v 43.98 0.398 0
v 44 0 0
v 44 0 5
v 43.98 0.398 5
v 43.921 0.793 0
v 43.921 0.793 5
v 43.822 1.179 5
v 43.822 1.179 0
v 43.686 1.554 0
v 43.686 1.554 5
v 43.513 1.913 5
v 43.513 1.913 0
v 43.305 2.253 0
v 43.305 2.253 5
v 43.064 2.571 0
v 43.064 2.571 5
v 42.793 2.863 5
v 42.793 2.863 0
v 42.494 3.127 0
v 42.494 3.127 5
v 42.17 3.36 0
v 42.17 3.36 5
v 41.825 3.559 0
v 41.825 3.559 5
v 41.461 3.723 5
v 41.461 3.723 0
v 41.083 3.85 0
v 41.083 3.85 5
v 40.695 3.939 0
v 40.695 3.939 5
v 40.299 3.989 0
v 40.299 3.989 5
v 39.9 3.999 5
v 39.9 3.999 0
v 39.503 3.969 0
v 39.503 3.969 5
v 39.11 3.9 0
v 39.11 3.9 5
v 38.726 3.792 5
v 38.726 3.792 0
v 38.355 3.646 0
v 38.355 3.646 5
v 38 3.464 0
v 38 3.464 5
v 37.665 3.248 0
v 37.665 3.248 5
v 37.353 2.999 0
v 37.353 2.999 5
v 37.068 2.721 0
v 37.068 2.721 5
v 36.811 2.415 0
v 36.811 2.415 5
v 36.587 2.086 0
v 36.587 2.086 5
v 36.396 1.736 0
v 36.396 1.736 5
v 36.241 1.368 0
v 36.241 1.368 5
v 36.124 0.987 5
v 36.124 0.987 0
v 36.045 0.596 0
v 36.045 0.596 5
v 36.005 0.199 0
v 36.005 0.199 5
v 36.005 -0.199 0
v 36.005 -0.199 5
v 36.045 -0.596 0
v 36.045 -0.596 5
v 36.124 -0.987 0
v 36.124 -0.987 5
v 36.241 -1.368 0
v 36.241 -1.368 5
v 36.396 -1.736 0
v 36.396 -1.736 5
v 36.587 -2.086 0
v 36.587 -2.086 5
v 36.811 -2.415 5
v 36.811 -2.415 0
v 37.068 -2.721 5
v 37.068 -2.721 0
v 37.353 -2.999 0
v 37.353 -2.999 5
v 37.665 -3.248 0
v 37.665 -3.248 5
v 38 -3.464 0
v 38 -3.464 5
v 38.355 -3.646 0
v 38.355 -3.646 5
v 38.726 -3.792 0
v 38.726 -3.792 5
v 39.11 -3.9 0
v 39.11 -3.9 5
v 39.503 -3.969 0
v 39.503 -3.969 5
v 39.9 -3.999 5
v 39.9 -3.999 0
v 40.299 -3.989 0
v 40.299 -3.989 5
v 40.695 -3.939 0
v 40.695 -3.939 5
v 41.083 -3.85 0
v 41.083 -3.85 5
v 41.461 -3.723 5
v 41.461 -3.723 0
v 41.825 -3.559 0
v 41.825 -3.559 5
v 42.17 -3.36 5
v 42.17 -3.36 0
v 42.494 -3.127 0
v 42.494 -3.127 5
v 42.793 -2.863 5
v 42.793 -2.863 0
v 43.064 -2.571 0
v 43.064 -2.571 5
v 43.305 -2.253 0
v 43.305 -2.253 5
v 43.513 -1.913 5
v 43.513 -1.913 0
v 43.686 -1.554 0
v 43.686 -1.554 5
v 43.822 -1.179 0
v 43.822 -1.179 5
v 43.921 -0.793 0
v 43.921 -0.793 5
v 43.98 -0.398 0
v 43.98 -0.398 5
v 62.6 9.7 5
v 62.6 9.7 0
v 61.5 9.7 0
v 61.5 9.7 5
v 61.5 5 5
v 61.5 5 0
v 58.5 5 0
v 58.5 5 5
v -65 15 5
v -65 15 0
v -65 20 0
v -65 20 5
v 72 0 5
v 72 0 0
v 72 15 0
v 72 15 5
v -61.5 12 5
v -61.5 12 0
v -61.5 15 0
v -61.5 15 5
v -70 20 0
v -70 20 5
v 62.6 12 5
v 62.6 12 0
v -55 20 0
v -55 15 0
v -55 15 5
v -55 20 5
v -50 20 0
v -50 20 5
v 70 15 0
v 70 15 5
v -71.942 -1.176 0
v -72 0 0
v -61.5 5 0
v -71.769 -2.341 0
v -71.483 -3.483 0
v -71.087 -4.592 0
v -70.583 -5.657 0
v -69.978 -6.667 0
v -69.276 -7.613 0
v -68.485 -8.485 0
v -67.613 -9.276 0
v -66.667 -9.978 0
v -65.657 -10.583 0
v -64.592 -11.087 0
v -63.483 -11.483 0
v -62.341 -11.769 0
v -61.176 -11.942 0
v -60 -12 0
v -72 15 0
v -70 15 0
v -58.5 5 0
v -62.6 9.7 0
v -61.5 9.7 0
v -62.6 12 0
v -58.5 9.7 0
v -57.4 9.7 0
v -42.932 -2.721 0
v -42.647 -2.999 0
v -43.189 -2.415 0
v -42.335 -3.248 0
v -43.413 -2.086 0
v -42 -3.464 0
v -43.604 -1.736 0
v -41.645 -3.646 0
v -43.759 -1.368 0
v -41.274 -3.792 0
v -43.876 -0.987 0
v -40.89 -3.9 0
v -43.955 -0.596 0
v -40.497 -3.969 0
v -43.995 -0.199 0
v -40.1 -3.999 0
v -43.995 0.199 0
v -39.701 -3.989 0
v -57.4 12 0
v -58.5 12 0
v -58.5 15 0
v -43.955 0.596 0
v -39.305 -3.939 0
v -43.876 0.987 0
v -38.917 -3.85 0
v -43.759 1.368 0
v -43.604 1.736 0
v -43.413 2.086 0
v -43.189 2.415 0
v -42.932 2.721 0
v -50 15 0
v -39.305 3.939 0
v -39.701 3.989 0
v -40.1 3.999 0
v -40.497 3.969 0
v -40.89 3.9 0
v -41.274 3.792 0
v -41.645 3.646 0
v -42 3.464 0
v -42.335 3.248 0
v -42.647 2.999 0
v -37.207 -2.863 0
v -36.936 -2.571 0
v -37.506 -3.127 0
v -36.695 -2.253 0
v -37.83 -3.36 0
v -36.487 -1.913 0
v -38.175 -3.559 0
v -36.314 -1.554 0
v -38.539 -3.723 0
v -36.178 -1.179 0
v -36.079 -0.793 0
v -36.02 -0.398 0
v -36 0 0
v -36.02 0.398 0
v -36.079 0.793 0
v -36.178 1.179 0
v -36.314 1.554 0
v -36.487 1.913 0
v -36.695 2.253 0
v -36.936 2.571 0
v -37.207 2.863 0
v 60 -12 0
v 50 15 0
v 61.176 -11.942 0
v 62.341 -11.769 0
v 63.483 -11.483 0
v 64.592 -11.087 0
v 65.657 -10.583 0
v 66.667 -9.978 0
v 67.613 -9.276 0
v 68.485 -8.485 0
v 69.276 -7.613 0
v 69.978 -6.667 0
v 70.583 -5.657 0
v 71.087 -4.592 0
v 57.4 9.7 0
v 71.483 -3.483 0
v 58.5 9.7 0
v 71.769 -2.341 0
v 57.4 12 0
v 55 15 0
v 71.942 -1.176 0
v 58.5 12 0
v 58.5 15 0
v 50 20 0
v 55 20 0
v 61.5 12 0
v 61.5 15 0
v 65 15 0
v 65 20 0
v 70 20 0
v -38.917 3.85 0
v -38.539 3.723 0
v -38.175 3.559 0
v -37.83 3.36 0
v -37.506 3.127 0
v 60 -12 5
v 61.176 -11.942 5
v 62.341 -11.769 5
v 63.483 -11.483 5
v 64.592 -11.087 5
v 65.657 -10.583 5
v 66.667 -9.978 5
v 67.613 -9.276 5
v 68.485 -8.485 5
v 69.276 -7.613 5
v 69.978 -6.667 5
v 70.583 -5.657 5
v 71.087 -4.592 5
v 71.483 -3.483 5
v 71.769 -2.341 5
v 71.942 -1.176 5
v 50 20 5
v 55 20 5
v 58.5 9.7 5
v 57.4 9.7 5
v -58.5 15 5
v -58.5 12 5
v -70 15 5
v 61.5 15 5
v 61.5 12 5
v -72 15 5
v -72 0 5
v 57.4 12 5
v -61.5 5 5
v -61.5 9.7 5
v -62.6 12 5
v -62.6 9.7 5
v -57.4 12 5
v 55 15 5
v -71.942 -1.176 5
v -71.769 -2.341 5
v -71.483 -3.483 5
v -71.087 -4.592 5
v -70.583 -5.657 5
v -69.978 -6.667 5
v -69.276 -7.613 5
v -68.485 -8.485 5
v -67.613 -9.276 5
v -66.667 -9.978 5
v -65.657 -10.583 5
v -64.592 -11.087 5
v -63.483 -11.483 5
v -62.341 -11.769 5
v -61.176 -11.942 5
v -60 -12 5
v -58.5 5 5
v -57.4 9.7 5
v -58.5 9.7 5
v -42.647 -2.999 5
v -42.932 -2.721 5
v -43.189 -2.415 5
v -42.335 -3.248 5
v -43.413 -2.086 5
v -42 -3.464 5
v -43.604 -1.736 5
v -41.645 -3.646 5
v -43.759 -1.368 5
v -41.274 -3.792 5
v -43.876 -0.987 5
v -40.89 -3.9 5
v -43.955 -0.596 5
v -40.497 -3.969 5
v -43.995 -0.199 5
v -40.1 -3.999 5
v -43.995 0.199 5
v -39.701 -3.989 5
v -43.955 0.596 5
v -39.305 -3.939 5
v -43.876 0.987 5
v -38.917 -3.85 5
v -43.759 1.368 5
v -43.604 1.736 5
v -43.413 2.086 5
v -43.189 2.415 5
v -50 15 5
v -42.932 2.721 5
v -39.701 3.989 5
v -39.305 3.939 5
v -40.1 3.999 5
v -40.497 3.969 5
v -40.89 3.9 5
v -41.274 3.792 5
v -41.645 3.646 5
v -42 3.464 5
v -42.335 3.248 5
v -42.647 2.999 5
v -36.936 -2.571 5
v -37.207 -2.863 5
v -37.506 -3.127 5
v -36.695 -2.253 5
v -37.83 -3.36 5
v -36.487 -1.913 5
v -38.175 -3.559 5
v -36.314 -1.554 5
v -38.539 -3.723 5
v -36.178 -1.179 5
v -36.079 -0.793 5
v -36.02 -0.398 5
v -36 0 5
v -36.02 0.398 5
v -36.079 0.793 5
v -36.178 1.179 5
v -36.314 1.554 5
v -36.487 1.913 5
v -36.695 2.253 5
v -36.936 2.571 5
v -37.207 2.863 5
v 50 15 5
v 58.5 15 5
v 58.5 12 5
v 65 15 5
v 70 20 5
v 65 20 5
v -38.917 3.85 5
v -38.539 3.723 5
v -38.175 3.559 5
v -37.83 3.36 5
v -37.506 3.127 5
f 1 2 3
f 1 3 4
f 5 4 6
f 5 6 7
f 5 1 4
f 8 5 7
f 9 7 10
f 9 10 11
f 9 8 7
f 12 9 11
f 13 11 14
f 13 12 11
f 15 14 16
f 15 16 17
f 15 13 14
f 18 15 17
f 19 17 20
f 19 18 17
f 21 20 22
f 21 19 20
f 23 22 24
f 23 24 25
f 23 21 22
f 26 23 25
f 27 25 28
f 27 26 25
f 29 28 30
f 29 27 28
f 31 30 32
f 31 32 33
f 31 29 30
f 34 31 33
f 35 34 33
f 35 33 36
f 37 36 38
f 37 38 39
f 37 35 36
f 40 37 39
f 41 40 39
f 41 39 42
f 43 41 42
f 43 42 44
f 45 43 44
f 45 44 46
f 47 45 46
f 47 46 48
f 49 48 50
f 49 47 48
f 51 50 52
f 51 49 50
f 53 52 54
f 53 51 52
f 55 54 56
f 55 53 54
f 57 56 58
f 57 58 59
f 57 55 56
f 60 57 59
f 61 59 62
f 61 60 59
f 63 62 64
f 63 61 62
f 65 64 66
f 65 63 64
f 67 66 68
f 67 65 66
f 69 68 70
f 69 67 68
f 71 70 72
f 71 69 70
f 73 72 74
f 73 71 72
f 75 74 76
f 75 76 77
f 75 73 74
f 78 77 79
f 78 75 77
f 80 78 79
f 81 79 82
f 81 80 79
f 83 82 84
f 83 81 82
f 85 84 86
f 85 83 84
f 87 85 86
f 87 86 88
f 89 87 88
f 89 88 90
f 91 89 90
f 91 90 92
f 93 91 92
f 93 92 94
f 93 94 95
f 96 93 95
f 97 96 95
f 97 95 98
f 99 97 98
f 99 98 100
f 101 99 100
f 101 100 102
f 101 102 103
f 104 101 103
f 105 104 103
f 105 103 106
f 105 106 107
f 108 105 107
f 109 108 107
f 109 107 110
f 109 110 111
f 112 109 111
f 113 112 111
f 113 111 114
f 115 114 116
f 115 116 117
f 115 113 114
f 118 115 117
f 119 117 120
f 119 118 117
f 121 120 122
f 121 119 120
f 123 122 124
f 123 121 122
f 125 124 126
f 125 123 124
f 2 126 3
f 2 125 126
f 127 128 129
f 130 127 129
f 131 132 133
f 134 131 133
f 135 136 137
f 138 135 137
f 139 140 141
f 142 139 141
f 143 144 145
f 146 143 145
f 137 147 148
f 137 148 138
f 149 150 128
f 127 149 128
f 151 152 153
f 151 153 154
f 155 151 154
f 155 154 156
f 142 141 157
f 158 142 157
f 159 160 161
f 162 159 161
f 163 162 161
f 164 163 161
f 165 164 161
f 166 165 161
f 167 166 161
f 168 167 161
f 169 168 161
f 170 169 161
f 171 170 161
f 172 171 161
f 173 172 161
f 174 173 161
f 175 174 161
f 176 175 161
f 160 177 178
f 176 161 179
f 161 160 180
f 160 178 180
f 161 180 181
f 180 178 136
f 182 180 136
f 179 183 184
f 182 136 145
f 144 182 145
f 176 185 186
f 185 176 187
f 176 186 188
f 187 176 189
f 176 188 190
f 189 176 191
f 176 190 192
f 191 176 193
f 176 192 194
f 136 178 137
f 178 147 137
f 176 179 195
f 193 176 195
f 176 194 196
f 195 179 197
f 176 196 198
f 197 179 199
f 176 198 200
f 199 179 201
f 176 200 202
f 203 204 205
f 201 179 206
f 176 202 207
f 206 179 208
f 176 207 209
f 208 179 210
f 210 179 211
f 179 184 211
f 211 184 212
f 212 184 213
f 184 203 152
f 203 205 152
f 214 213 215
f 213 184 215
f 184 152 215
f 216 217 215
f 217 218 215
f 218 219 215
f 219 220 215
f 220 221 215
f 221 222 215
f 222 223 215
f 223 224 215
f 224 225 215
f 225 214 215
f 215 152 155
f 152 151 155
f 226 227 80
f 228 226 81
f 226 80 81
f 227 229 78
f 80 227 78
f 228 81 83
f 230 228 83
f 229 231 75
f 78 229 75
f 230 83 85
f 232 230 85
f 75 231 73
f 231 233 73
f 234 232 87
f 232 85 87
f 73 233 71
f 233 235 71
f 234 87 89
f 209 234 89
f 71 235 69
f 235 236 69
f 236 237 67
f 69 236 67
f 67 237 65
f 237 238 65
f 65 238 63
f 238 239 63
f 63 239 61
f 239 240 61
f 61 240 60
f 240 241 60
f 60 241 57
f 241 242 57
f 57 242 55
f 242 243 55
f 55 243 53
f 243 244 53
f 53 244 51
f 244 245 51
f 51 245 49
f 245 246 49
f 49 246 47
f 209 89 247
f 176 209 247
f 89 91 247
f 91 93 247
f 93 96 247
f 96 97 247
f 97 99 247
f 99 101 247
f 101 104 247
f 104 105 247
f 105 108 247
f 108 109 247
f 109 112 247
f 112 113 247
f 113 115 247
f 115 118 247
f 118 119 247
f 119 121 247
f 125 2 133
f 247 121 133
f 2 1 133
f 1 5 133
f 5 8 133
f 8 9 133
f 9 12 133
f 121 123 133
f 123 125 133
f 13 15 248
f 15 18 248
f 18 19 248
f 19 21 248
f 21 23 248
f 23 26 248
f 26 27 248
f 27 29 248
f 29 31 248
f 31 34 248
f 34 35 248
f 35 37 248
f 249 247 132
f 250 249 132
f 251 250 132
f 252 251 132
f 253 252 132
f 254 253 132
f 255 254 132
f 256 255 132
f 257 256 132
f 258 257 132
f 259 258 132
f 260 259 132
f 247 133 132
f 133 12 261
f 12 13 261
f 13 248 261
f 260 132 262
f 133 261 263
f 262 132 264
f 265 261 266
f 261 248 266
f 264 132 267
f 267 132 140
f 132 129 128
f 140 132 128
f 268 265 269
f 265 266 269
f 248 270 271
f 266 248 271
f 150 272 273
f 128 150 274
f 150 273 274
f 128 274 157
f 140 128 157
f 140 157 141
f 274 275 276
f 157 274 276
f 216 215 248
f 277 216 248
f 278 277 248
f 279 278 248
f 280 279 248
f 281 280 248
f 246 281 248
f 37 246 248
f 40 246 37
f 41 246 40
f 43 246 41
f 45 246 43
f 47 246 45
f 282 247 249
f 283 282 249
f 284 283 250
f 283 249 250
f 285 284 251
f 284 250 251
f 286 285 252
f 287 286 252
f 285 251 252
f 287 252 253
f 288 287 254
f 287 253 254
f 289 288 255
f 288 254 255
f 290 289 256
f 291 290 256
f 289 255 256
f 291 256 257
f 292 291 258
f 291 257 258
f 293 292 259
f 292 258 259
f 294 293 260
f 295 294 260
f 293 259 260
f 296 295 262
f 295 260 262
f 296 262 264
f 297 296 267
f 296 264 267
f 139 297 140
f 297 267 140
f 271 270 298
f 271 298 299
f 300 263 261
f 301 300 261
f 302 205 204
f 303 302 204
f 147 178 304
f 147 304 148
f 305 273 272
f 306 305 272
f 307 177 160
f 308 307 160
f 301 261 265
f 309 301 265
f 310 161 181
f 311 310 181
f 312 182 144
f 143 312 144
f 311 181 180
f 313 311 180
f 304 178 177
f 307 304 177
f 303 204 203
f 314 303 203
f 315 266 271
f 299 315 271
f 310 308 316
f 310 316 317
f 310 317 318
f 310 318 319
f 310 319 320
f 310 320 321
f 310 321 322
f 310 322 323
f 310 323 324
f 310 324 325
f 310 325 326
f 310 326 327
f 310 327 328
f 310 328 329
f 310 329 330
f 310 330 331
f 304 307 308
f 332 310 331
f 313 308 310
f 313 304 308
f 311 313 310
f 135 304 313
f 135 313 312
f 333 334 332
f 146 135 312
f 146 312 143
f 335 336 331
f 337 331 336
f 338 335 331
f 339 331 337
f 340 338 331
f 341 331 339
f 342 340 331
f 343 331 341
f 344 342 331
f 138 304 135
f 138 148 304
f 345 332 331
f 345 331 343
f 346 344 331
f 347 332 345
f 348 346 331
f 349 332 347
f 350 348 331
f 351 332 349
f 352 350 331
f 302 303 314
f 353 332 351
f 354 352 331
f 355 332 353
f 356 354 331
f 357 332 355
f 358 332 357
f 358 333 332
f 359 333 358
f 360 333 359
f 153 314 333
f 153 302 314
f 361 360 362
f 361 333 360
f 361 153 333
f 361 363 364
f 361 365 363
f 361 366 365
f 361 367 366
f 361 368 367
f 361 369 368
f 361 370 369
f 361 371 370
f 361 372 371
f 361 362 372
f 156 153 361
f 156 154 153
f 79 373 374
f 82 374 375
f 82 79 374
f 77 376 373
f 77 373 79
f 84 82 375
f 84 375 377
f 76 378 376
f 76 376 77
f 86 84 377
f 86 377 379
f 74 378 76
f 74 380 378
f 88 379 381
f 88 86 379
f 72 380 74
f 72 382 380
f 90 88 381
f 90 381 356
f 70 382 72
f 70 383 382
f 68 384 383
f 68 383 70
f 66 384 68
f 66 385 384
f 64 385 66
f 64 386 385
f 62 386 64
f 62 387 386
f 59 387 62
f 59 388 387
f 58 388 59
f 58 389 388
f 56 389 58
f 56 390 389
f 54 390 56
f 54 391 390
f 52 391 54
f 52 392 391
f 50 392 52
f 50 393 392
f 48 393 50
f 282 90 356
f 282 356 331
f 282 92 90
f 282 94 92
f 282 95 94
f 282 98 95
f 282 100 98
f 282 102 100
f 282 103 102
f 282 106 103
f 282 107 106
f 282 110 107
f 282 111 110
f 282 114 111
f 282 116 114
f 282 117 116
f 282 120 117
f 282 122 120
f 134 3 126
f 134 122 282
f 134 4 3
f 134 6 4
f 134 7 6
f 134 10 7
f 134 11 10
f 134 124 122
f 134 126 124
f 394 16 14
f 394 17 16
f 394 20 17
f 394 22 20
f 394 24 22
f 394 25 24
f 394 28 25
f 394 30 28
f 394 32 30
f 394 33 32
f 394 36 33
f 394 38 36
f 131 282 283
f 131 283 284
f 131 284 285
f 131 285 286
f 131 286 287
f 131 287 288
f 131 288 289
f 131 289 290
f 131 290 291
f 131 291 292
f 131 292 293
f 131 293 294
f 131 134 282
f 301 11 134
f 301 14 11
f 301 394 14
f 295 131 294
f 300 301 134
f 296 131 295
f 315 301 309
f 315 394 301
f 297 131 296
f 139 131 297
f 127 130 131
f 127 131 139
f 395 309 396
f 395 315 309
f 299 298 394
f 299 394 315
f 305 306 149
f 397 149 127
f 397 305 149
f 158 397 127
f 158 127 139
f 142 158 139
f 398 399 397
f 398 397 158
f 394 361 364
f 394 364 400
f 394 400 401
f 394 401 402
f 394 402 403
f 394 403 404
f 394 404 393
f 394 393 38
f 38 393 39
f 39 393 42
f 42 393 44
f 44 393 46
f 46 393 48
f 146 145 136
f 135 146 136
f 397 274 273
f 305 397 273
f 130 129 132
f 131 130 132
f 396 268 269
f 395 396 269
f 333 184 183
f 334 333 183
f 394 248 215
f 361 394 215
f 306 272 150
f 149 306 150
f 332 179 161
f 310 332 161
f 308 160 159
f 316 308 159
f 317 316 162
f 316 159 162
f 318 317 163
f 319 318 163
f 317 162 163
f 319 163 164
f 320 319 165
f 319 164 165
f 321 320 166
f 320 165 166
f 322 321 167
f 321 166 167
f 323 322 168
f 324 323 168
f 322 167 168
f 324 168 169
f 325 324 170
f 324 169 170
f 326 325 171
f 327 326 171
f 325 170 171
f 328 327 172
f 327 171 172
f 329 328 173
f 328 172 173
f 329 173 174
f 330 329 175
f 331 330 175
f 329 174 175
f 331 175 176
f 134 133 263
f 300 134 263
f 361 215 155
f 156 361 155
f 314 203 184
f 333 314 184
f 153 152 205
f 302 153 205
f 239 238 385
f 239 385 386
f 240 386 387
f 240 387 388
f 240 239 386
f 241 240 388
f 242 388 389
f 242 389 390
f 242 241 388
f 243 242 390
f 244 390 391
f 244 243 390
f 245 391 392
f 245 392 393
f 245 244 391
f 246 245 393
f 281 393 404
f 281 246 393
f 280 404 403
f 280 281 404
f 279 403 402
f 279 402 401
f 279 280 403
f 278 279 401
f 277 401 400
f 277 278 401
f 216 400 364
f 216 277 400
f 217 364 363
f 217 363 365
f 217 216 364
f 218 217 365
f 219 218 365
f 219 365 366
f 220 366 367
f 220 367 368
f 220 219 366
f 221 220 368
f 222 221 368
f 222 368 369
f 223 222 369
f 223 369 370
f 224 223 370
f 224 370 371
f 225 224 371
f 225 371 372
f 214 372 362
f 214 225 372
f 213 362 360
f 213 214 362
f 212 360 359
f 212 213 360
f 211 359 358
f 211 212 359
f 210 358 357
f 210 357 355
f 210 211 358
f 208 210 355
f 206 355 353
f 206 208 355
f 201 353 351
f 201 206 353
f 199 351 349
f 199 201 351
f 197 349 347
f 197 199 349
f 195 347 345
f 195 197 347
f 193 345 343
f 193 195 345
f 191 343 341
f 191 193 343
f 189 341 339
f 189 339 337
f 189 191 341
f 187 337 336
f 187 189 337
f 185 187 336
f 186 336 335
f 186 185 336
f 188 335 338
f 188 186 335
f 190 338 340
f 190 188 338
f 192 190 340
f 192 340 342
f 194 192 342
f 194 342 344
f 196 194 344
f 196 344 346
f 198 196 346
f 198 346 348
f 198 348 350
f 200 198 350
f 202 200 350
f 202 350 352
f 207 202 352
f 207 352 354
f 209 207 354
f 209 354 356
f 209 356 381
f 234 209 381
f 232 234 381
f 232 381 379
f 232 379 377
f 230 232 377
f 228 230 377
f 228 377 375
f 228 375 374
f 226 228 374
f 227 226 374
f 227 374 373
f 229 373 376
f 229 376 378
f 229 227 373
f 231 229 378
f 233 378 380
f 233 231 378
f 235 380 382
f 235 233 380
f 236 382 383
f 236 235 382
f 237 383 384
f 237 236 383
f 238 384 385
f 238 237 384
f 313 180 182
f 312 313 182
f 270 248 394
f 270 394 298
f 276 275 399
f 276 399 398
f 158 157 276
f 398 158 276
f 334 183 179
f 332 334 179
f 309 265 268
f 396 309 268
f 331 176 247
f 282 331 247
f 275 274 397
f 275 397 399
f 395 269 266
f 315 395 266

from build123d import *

# Parameters (mm, degrees)
SKETCH1_R           = 4
SKETCH1_W           = 5
SKETCH1_H           = 5
BOSS_EXTRUDE2_DEPTH = 5


with BuildPart() as part:
    # Sketch1 → Boss-Extrude2 (new body)
    # profile 1 of 5: a face of its own
    with BuildSketch(Plane.XY):
        with BuildLine():
            Line((-72, 15), (-72, 0))
            ThreePointArc((-72, 0), (-68.485281374, -8.485281374), (-60, -12))
            Line((-60, -12), (60, -12))
            ThreePointArc((60, -12), (68.485281374, -8.485281374), (72, 0))
            Line((72, 0), (72, 15))
            Line((72, 15), (70, 15))
            Line((70, 15), (65, 15))
            Line((65, 15), (61.5, 15))
            Line((61.5, 15), (61.5, 12))
            Line((61.5, 12), (62.6, 12))
            Line((62.6, 12), (62.6, 9.7))
            Line((62.6, 9.7), (61.5, 9.7))
            Line((61.5, 9.7), (61.5, 5))
            Line((61.5, 5), (58.5, 5))
            Line((58.5, 5), (58.5, 9.7))
            Line((58.5, 9.7), (57.4, 9.7))
            Line((57.4, 9.7), (57.4, 12))
            Line((57.4, 12), (58.5, 12))
            Line((58.5, 12), (58.5, 15))
            Line((58.5, 15), (55, 15))
            Line((55, 15), (50, 15))
            Line((50, 15), (-50, 15))
            Line((-50, 15), (-55, 15))
            Line((-55, 15), (-58.5, 15))
            Line((-58.5, 15), (-58.5, 12))
            Line((-58.5, 12), (-57.4, 12))
            Line((-57.4, 12), (-57.4, 9.7))
            Line((-57.4, 9.7), (-58.5, 9.7))
            Line((-58.5, 9.7), (-58.5, 5))
            Line((-58.5, 5), (-61.5, 5))
            Line((-61.5, 5), (-61.5, 9.7))
            Line((-61.5, 9.7), (-62.6, 9.7))
            Line((-62.6, 9.7), (-62.6, 12))
            Line((-62.6, 12), (-61.5, 12))
            Line((-61.5, 12), (-61.5, 15))
            Line((-61.5, 15), (-65, 15))
            Line((-65, 15), (-70, 15))
            Line((-70, 15), (-72, 15))
        make_face()
        with Locations((-40, 0)):
            Circle(SKETCH1_R, mode=Mode.SUBTRACT)
        with Locations((40, 0)):
            Circle(SKETCH1_R, mode=Mode.SUBTRACT)
    # profile 2 of 5: a face of its own
    with BuildSketch(Plane.XY):
        with Locations((52.5, 17.5)):
            Rectangle(SKETCH1_W, SKETCH1_H)
    # profile 3 of 5: a face of its own
    with BuildSketch(Plane.XY):
        with Locations((67.5, 17.5)):
            Rectangle(SKETCH1_W, SKETCH1_H)
    # profile 4 of 5: a face of its own
    with BuildSketch(Plane.XY):
        with Locations((-67.5, 17.5)):
            Rectangle(SKETCH1_W, SKETCH1_H)
    # profile 5 of 5: a face of its own
    with BuildSketch(Plane.XY):
        with Locations((-52.5, 17.5)):
            Rectangle(SKETCH1_W, SKETCH1_H)
    extrude(amount=BOSS_EXTRUDE2_DEPTH)


solid = part.part
